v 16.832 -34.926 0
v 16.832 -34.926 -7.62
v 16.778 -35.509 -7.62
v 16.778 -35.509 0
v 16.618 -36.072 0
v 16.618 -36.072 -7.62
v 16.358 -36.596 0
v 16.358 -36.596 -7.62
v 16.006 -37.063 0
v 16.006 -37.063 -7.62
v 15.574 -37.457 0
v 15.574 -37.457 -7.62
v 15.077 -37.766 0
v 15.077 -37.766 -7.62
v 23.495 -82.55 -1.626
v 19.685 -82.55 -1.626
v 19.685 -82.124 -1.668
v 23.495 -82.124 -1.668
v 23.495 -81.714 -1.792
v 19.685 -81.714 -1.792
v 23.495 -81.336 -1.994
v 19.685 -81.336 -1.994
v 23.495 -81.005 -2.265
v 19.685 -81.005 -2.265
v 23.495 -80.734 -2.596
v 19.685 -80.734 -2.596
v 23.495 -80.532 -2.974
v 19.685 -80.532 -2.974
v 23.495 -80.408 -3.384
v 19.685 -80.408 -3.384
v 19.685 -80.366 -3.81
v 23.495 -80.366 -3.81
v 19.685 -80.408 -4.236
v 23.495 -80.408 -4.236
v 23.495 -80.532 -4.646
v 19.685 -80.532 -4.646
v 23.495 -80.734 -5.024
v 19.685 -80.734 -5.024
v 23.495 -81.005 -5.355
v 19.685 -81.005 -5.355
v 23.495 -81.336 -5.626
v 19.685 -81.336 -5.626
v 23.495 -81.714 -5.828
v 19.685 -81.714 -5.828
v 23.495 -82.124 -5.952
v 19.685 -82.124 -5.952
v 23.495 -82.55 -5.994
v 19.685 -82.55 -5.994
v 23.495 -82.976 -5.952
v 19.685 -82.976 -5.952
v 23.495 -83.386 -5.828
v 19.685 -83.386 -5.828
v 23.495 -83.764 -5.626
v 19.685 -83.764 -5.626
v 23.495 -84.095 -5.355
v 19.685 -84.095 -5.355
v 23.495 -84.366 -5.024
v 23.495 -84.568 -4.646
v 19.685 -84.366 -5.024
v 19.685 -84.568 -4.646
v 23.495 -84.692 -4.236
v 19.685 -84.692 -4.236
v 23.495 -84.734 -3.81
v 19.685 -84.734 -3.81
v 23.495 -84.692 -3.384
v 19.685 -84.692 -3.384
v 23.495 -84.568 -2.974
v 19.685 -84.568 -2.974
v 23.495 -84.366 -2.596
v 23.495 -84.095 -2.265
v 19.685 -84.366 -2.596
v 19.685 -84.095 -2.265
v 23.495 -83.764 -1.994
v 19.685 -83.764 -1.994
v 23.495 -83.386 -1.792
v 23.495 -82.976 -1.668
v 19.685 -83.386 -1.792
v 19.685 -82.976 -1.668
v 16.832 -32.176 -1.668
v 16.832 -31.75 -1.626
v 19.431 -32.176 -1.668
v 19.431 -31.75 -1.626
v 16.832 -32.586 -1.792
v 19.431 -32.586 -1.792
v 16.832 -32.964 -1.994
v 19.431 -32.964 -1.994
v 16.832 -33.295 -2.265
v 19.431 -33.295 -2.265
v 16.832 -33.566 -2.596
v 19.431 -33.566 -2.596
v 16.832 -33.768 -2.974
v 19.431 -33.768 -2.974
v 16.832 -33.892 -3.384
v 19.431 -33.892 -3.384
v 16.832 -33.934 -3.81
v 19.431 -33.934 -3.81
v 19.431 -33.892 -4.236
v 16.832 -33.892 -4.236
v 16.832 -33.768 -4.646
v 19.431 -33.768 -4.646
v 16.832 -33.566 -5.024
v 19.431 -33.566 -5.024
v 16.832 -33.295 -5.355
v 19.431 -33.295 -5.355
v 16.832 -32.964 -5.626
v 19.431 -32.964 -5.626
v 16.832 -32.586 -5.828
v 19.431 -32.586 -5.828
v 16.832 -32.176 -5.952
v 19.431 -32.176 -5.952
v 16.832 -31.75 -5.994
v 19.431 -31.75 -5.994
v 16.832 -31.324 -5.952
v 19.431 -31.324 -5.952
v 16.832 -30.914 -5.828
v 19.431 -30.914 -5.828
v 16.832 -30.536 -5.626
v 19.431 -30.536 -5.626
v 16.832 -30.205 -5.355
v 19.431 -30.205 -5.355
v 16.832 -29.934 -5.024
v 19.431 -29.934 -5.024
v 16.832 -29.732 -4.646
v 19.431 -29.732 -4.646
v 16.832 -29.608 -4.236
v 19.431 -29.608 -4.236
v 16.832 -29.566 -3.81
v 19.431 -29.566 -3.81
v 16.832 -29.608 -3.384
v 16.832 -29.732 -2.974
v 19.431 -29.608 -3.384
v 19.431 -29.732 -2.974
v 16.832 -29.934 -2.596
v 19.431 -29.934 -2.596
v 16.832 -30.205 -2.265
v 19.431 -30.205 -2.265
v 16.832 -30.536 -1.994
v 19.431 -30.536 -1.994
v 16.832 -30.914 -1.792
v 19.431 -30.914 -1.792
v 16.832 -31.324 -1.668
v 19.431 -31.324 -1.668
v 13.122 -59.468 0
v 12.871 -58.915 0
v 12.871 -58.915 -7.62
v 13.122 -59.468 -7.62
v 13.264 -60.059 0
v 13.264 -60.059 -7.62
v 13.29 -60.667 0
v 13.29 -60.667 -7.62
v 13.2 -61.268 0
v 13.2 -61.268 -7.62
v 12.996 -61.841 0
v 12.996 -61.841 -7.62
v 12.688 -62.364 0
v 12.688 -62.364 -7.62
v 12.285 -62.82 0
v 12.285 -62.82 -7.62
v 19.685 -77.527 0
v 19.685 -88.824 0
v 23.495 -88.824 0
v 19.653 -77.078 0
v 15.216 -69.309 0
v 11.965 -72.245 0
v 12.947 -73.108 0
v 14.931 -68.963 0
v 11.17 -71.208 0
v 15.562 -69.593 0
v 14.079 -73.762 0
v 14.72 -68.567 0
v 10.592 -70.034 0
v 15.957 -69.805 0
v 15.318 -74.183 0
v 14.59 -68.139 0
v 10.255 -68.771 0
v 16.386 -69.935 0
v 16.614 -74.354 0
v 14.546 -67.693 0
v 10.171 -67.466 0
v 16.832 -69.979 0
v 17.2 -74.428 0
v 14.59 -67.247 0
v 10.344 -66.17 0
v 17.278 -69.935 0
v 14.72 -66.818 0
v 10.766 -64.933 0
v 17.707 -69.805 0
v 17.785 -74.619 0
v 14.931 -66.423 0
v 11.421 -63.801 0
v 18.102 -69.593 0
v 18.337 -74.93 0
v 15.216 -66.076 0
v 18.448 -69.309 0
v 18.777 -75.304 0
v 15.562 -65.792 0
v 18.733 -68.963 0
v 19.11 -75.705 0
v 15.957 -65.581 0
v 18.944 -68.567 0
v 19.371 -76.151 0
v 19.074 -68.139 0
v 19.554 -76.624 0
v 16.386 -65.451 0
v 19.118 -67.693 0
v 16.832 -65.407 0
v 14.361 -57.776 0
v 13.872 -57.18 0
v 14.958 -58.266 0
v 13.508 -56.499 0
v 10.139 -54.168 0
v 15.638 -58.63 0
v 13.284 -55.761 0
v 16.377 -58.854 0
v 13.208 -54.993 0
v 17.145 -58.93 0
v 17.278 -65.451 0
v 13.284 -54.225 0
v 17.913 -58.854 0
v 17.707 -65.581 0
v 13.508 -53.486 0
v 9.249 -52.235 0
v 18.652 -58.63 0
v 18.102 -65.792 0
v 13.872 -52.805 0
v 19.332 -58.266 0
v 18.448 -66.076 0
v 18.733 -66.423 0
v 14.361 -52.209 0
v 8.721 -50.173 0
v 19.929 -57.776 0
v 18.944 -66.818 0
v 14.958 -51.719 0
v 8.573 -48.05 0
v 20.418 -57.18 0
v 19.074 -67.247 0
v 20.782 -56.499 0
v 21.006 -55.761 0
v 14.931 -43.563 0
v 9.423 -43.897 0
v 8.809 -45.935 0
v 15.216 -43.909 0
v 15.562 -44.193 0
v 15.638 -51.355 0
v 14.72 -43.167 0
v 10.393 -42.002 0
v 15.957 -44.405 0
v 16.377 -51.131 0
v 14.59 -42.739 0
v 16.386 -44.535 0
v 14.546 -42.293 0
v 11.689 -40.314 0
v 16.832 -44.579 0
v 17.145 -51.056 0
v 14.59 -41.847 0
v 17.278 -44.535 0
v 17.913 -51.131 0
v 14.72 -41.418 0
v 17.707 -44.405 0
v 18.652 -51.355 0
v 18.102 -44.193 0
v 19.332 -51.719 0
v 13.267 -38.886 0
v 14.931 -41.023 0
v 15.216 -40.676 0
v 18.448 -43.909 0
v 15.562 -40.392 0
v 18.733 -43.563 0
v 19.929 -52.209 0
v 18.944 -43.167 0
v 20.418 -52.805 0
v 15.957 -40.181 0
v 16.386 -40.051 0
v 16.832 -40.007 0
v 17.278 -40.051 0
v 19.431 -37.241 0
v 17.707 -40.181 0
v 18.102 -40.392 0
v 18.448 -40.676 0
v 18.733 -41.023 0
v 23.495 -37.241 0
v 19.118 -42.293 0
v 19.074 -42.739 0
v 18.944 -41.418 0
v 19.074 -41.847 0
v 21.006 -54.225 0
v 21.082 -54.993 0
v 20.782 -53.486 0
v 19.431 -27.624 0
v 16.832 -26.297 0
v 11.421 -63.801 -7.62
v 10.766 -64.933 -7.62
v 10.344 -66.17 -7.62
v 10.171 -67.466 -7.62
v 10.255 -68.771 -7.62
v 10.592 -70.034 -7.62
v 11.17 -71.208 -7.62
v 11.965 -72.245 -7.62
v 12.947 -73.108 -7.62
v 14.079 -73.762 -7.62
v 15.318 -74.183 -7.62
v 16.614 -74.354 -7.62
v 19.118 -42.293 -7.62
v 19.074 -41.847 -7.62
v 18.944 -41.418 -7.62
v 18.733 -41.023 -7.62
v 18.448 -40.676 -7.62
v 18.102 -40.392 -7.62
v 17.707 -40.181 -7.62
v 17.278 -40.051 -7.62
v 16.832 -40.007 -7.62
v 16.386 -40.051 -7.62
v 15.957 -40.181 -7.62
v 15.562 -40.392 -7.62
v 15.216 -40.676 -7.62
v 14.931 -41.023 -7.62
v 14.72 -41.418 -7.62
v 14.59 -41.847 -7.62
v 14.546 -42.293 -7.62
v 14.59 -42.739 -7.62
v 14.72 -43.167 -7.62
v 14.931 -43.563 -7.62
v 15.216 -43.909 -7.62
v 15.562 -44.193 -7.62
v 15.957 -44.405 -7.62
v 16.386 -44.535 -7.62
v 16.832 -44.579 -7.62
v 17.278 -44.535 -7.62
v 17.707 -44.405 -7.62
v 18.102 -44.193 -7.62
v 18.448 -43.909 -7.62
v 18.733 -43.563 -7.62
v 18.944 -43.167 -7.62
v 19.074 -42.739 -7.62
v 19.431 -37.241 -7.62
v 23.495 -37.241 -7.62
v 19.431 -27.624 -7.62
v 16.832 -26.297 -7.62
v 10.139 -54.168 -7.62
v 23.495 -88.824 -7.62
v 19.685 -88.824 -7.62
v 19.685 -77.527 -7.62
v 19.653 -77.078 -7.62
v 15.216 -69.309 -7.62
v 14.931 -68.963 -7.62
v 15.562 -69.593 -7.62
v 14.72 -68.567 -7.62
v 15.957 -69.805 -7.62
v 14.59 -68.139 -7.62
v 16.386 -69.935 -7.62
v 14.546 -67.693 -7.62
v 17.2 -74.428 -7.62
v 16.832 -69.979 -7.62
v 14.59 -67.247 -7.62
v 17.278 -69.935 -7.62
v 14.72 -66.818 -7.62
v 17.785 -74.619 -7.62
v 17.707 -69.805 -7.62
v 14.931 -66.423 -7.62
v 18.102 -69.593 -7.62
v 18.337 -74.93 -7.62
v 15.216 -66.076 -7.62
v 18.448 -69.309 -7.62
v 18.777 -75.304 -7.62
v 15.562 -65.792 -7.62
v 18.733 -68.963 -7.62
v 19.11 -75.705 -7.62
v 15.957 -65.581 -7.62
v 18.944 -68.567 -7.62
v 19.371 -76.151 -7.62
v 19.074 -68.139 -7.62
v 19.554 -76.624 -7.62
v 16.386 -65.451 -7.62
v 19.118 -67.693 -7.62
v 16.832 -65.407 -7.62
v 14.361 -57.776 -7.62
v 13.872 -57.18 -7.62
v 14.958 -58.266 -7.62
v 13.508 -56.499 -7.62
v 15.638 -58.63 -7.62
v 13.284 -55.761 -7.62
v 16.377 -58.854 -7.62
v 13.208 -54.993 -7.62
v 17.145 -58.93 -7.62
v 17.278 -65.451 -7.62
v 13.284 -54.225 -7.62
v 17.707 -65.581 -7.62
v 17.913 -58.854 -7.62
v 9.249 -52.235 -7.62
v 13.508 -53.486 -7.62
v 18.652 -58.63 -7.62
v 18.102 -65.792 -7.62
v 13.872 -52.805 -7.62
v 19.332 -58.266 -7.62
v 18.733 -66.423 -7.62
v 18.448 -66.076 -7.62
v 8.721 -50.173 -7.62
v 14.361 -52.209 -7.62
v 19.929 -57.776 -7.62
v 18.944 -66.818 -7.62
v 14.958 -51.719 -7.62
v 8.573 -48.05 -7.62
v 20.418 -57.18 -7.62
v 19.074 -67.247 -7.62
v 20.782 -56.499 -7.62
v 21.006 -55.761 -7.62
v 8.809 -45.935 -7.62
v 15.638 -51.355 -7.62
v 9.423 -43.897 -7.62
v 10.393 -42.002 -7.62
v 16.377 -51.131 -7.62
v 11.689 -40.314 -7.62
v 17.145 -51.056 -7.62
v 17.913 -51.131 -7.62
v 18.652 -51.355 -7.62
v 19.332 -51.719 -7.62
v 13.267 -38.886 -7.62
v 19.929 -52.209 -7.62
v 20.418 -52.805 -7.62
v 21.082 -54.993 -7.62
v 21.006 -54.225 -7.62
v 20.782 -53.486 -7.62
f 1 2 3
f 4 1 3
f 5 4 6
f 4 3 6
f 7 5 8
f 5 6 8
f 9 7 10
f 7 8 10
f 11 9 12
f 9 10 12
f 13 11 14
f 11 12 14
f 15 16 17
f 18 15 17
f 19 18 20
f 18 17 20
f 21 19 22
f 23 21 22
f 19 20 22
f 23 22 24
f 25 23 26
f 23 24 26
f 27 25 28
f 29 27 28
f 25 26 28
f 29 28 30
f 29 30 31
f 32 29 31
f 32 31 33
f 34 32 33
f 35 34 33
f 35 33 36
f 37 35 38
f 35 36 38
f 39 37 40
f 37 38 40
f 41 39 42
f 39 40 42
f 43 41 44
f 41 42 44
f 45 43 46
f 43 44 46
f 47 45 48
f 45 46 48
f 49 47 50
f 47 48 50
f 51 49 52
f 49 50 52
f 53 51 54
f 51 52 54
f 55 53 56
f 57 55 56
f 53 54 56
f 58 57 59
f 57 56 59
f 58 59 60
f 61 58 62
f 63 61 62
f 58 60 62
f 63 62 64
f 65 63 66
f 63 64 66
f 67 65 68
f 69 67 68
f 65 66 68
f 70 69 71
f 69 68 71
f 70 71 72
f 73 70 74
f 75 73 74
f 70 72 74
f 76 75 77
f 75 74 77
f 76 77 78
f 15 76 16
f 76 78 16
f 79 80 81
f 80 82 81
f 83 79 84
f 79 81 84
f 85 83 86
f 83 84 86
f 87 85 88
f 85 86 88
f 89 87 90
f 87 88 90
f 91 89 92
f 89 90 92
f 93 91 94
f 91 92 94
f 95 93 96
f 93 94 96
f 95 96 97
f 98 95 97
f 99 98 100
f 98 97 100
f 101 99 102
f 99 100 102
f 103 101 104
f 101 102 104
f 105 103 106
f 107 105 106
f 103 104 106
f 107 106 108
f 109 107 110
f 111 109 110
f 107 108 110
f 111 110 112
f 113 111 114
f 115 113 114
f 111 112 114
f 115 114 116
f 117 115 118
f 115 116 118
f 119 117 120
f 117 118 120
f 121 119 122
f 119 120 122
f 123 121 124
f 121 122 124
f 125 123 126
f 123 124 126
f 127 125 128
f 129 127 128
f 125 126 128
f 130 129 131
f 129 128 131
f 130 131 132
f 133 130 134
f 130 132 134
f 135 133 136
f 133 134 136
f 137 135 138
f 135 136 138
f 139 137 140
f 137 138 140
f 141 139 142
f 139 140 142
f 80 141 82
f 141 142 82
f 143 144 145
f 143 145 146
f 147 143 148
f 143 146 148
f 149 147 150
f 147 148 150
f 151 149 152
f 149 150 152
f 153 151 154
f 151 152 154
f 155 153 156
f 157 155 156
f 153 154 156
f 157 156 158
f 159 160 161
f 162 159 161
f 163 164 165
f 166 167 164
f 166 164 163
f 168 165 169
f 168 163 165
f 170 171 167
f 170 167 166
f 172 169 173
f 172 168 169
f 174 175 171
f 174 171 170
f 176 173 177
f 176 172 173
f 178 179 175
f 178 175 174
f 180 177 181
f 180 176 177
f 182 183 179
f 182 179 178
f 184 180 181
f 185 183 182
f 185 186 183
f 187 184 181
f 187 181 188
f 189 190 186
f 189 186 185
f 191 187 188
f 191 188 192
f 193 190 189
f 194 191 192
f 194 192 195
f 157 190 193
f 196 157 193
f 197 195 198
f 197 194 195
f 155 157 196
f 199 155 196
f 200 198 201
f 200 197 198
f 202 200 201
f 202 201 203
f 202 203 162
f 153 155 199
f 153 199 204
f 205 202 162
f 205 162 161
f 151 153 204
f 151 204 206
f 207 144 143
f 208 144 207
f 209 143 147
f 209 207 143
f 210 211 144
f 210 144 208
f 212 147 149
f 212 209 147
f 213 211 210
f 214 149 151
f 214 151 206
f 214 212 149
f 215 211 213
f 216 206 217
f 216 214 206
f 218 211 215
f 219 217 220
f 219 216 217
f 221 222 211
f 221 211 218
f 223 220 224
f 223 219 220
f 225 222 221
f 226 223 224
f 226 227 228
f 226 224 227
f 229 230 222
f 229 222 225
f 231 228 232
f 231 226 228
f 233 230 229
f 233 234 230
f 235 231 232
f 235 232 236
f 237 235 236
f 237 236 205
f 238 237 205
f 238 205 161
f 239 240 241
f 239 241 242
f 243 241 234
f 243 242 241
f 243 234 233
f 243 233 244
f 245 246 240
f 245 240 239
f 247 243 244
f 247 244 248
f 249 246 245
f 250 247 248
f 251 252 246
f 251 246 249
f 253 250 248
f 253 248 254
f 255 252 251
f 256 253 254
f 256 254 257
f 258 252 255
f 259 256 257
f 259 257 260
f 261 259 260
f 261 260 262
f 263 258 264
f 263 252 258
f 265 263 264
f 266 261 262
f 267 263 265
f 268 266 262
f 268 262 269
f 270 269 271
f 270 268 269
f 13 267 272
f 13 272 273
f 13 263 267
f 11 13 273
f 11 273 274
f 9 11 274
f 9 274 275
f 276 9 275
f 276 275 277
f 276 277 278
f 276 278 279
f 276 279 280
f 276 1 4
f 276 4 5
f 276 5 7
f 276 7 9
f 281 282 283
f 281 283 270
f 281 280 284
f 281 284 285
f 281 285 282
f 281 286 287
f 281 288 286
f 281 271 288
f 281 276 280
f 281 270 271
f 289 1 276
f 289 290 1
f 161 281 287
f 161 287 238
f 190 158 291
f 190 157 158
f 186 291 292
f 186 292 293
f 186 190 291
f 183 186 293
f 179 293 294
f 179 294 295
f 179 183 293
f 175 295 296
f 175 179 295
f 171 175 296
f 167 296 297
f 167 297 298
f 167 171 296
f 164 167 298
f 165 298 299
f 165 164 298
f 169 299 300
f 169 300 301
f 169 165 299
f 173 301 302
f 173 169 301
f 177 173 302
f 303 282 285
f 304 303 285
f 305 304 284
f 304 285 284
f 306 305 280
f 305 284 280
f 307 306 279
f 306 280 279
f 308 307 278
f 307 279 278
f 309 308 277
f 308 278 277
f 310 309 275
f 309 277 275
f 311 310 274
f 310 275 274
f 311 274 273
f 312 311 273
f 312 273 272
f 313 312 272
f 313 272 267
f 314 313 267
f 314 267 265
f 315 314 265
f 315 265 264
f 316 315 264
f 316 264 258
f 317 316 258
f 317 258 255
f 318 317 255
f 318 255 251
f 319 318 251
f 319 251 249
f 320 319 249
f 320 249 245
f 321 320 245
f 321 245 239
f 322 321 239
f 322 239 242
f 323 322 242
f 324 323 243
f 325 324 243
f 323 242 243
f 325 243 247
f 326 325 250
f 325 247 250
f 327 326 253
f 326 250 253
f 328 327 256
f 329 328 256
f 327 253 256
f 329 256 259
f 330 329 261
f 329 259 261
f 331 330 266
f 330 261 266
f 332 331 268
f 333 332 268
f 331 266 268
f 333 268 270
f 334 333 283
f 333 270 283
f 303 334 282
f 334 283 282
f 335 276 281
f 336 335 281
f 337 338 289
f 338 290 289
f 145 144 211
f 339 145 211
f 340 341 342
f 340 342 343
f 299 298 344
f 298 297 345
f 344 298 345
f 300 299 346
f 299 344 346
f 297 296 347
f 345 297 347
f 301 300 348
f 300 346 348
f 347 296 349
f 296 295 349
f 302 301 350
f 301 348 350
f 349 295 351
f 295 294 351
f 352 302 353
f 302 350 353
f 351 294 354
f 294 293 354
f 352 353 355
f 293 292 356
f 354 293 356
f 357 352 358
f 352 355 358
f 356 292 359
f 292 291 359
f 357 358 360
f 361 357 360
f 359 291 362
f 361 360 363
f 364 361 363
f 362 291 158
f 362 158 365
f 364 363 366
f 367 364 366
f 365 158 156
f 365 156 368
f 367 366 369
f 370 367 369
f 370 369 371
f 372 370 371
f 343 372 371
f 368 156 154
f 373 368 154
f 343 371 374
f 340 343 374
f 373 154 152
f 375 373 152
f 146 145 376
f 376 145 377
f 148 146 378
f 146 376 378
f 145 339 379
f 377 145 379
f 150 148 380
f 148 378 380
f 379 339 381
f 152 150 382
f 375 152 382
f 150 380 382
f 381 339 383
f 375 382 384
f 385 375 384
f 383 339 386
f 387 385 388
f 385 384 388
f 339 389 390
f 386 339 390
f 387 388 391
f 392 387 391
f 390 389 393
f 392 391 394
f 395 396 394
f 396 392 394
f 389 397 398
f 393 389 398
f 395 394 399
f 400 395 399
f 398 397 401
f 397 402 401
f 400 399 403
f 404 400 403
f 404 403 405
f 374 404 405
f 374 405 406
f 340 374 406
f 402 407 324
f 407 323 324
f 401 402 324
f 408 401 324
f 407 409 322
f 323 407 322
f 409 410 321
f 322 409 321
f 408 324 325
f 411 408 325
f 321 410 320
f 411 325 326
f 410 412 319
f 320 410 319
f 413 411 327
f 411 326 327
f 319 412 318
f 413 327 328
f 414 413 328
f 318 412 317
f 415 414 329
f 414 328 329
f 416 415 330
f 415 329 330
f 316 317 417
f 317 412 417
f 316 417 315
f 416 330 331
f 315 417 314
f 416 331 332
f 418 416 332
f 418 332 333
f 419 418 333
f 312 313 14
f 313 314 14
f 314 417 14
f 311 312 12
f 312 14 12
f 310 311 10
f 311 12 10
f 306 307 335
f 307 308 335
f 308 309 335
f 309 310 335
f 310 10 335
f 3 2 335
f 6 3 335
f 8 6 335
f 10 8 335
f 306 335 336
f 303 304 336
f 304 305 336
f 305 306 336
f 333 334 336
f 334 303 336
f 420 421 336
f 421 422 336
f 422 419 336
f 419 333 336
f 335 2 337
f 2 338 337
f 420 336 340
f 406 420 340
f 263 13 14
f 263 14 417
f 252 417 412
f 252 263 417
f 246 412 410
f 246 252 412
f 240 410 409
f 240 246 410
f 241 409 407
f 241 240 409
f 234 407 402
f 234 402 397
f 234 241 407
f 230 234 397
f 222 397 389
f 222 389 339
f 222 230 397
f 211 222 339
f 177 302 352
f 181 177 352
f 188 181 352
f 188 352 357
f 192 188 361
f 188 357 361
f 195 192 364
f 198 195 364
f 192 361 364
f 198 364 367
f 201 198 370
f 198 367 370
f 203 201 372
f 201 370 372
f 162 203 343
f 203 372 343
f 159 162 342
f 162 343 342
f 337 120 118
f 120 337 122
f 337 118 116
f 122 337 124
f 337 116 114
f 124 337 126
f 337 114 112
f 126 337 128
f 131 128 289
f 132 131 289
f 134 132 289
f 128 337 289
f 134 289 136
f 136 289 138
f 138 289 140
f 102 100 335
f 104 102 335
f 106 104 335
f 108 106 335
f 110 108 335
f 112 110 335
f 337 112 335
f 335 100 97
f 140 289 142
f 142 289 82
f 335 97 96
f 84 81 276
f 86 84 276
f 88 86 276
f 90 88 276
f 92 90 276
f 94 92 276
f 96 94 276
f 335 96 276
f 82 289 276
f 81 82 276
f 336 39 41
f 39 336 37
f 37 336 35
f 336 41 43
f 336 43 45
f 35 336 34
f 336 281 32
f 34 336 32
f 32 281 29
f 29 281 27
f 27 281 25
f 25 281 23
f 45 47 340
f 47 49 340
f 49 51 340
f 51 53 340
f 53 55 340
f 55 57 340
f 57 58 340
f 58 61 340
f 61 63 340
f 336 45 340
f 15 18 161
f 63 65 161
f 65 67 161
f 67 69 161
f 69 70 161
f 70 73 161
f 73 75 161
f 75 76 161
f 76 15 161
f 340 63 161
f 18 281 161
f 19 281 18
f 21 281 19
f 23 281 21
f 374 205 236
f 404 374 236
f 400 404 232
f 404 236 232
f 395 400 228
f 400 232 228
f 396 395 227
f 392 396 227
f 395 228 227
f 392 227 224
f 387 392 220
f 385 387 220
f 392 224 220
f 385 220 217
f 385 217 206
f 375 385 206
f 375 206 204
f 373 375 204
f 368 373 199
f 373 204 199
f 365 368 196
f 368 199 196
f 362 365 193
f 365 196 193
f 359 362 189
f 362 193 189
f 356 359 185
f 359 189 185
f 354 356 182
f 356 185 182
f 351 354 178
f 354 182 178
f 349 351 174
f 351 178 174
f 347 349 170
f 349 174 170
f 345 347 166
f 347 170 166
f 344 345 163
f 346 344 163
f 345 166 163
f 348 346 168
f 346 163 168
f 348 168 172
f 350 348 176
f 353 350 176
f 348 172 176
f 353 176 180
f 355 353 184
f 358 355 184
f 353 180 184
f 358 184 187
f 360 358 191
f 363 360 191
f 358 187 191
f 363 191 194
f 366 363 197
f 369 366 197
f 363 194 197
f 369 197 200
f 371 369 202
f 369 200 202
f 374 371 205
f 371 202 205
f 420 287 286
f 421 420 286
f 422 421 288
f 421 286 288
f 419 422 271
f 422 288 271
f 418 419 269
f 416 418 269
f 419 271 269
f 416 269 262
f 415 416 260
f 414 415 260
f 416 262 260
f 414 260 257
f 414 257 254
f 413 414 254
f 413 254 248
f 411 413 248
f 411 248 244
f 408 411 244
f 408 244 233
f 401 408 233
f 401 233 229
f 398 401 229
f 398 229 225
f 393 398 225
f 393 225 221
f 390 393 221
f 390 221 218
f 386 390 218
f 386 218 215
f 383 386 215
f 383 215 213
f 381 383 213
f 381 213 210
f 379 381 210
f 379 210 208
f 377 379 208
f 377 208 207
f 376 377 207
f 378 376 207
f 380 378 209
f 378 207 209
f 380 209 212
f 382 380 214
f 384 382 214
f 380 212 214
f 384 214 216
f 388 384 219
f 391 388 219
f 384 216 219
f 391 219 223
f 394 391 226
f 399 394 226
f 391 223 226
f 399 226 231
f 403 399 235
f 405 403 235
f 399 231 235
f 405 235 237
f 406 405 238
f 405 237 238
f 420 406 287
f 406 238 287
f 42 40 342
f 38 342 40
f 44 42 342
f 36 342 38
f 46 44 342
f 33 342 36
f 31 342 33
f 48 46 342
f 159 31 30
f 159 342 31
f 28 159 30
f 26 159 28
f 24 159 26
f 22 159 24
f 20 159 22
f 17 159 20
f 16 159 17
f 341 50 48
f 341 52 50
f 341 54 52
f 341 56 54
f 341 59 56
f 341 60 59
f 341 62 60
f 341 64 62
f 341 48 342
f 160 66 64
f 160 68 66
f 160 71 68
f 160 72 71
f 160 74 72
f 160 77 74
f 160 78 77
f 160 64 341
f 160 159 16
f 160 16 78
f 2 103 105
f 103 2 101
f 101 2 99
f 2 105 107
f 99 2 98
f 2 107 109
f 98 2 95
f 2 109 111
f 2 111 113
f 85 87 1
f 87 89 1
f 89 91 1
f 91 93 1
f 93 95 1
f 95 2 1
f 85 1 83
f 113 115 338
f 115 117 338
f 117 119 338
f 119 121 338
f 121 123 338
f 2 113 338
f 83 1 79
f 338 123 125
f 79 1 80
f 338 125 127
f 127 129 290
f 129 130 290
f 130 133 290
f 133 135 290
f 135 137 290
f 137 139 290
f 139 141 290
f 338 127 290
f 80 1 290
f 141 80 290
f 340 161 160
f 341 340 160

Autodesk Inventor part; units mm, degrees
ref_plane "YZ Plane" through (0, 0, 0) normal (1, 0, 0) x (0, 1, 0)
ref_plane "Work Plane1" through (0, 0, 0) normal (0, 0, 1) x (1, 0, 0)
ref_plane "Work Plane2" through (-23.495, -37.0586, -7.62) normal (0, 0, -1) x (0, 1, 0)
sketch "Sketch1" plane through (0, 0, 0) normal (0, 0, 1) x (1, 0, 0)
  circle A0 centre (-14.605, 0) radius 3.81
  line L0 (23.495, -13.6398) -> (23.495, -75.1078)
  line L1 (-14.605, 0) -> (17.145, -54.9926) construction
  circle A1 centre (17.145, -54.9926) radius 3.937
  line L2 (-14.605, 0) -> (17.145, 54.9926) construction
  circle A2 centre (17.145, 54.9926) radius 2.286
  line L3 (19.685, -33.9344) -> (23.495, -33.9344)
  line L4 (19.685, -29.5656) -> (23.495, -29.5656)
  line L5 (23.495, -46.7614) -> (25.0825, -46.7614)
  line L6 (23.495, -72.1614) -> (25.0825, -72.1614)
  line L7 (23.495, -67.5386) -> (25.0825, -67.5386)
  line L8 (23.495, -76.1238) -> (25.0825, -76.1238)
  line L9 (10.1391, -54.1676) -> (16.832, -37.0586)
  line L10 (16.832, -37.0586) -> (16.832, -26.036)
  line L11 (19.685, -27.493) -> (-18.6482, -7.9174)
  line L12 (19.685, -27.493) -> (19.685, -37.0586)
  line L13 (19.685, -37.0586) -> (23.495, -37.0586)
  line L14 (23.495, -37.0586) -> (23.495, -64.1344)
  line L15 (23.495, -64.1344) -> (15.875, -64.1344)
  line L16 (19.685, -64.1344) -> (19.685, -76.1238)
  line L17 (19.685, -76.1238) -> (23.495, -76.1238)
  line L18 (15.875, -64.1344) -> (10.1391, -54.1676)
  line L19 (19.431, -27.3632) -> (19.431, -37.0586)
  line L20 (19.431, -37.0586) -> (19.685, -37.0586)
  line L21 (16.832, -26.2966) -> (19.685, -27.7535)
  line L22 (19.431, -37.0586) -> (19.431, -37.241)
  line L23 (19.431, -37.241) -> (23.495, -37.241)
  line L24 (23.495, -76.1238) -> (23.495, -64.1344)
  circle A3 centre (16.832, -42.2926) radius 2.286
  circle A4 centre (16.832, -67.6926) radius 2.286
  arc A5 (16.832, -37.0586) -> (10.1391, -54.1676) centre (20.3426, -48.2955) ccw
  circle A6 centre (16.832, -67.6926) radius 6.6647
  line L25 (16.832, -74.3574) -> (23.495, -74.3574)
  line L26 (23.495, -76.1238) -> (23.495, -88.8238)
  line L27 (23.495, -88.8238) -> (19.685, -88.8238)
  line L28 (19.685, -88.8238) -> (19.685, -76.1238)
  point P0 (0, 0)
  point P1 (23.495, -37.241)
  point P2 (19.431, -27.6238)
  point P3 (14.3606, -61.503)
  point P4 (19.685, -74.3574)
extrude "Extrusion1" add sketch "Sketch1" against normal up to surface (7.62 mm away) contours L0 L15 A6 L18 L9 A3 L10 L21 L19 L22 L23 | L0 A6 L15 | L9 A3 A5 | L0 A6 L16 L15 | L15 L18 A6 | L0 L25 L16 A6 | L16 A6 L18 L15 | L16 L25 A6 | L0 L24 L17 L16 L25 | L17 L26 L27 L28
sketch "Sketch2" plane through (19.685, -76.1238, 0) normal (-1, 0, 0) x (0, 0, 1)
  circle A0 centre (-3.81, 6.2738) radius 2.1844 projected
  circle A1 centre (-3.81, 44.3738) radius 2.1844 projected
  circle A2 centre (-3.81, 44.3738) radius 2.1844 projected
  circle A3 centre (-3.81, -6.4262) radius 2.1844
  point P0 (0, 76.1238)
  dimension "d22" = 50.8
extrude "Extrusion2" cut sketch "Sketch2" along normal mid plane 25.4 contours A1 | A3
fillet "Fillet1" radius 3.175 2 edges at (14.3606, -61.503, -3.81) (16.832, -37.0586, -3.81)
fillet "Fillet2" radius 3.175 1 edges at (19.685, -74.3574, -3.81)
properties part number "DrivenMotorMount"
